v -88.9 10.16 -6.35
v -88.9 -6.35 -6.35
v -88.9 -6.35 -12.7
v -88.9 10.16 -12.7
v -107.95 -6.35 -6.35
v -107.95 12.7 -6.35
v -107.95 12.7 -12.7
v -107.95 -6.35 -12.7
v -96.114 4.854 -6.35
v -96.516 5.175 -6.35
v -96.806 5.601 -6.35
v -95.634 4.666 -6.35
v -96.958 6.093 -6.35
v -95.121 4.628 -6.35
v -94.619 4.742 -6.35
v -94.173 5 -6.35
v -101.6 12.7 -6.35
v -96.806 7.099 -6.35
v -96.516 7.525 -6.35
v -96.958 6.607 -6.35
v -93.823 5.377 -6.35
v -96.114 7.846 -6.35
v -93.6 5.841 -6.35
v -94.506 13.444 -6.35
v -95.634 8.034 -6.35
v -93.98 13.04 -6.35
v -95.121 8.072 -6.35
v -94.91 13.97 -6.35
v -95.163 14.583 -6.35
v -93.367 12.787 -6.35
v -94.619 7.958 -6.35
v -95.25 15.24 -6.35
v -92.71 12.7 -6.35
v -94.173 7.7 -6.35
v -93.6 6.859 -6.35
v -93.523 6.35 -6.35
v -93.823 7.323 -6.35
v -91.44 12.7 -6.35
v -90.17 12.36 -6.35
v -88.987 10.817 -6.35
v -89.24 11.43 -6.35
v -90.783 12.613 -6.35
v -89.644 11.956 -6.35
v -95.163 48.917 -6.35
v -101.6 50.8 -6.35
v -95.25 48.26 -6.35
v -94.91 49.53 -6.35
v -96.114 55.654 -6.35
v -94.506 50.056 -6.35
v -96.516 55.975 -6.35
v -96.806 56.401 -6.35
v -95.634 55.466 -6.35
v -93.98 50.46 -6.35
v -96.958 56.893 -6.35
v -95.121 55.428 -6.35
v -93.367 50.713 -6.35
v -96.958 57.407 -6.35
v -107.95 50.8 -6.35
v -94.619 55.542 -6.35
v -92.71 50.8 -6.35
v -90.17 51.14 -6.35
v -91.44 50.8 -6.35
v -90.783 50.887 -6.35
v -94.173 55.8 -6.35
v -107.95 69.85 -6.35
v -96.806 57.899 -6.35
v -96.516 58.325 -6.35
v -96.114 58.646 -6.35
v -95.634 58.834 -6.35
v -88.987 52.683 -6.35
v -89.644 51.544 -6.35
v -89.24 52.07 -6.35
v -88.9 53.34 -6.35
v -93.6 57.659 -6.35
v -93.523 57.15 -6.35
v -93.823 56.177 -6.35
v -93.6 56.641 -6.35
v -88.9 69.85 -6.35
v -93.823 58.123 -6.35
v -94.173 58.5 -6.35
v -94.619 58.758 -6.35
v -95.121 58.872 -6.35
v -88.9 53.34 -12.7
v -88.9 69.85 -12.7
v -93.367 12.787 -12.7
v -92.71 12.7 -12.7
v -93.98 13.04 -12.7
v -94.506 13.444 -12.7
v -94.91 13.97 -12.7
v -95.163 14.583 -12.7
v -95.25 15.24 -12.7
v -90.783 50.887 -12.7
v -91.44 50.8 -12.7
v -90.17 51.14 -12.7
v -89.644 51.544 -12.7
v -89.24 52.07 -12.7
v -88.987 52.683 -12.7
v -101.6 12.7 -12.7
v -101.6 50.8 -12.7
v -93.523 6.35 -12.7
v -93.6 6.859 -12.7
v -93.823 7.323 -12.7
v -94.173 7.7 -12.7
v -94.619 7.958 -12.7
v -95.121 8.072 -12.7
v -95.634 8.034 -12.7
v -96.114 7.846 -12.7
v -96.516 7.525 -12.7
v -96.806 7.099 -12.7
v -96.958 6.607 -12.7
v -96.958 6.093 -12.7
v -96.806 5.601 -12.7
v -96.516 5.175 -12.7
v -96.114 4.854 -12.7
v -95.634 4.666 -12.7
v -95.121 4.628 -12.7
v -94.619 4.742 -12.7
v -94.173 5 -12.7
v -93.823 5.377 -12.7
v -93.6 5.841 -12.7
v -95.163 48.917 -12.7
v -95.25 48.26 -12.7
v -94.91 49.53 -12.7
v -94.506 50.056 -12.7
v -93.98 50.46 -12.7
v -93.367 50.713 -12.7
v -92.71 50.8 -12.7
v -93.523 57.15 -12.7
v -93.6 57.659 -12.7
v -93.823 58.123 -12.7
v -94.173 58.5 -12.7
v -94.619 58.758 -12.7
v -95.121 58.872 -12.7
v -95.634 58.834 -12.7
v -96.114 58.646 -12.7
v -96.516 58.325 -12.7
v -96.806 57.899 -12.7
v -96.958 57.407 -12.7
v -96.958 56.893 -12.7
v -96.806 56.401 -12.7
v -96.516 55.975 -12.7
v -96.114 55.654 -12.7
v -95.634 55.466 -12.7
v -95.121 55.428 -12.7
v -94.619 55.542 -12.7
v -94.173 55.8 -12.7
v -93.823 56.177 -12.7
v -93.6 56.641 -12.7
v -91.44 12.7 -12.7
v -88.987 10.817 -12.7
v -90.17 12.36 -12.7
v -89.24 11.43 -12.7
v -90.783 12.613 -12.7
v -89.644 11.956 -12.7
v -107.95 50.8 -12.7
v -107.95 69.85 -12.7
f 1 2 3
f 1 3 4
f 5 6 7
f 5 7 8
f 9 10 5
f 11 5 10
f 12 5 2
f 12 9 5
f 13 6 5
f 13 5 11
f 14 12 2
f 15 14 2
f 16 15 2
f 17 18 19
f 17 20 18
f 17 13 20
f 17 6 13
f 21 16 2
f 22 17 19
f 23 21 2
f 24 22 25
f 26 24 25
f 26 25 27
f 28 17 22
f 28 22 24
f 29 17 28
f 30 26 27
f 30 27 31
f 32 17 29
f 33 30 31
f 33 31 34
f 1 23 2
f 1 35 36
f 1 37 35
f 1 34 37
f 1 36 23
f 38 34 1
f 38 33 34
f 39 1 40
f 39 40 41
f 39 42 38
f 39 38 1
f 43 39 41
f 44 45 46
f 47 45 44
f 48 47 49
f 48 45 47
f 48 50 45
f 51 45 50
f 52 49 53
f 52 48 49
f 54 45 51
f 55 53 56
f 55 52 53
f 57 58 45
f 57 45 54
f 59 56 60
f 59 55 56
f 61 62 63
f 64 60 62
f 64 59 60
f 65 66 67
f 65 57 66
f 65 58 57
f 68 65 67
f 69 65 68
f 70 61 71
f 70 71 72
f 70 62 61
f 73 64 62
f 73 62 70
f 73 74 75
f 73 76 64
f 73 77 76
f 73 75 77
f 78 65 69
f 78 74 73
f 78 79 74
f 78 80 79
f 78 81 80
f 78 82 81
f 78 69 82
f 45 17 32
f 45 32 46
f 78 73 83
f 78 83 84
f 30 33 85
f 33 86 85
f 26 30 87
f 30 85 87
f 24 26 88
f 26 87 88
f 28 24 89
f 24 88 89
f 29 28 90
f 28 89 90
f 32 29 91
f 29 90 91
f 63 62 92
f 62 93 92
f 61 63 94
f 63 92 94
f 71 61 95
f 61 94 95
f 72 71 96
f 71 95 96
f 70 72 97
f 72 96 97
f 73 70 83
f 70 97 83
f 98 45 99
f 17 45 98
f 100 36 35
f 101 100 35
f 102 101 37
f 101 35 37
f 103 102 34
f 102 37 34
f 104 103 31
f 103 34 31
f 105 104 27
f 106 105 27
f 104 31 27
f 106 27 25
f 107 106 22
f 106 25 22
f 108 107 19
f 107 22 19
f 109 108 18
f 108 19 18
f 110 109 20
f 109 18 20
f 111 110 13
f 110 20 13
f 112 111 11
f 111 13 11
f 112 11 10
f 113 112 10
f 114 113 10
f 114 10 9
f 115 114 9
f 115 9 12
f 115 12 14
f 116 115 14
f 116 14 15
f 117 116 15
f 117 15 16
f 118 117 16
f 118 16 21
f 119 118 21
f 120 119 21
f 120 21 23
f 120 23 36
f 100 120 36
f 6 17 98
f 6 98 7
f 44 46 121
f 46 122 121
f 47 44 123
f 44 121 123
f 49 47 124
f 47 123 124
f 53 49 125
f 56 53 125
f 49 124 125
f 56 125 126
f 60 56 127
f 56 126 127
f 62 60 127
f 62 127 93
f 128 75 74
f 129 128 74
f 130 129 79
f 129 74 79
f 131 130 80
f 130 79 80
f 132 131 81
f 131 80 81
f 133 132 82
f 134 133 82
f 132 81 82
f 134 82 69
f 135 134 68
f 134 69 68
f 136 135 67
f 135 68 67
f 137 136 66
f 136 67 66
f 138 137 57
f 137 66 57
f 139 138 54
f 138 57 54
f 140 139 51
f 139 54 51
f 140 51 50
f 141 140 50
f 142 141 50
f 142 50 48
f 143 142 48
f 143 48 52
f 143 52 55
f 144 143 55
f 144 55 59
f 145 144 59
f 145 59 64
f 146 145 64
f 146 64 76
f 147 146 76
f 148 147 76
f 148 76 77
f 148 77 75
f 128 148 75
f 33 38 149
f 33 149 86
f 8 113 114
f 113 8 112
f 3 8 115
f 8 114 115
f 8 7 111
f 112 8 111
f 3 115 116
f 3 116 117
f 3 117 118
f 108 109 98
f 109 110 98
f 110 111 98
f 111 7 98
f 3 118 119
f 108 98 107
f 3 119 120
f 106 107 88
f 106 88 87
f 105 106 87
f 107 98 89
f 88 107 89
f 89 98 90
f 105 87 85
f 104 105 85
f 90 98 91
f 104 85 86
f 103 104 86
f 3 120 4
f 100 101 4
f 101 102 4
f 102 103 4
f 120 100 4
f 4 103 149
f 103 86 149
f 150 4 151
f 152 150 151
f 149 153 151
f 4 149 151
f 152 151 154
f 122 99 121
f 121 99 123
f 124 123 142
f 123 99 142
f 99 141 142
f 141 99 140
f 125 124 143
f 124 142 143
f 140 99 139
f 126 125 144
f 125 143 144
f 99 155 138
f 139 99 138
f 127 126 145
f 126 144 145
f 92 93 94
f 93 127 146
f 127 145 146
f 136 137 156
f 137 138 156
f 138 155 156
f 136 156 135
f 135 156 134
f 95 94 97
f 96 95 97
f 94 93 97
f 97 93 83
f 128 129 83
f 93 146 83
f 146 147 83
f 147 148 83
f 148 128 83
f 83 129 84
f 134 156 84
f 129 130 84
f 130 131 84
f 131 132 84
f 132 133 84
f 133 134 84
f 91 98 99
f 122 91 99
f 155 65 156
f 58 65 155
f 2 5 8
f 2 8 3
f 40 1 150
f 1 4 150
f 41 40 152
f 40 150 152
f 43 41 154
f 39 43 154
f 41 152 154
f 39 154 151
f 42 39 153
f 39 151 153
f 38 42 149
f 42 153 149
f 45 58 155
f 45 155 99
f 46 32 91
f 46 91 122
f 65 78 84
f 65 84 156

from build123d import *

# Parameters (mm, degrees)
BOSS_EXTRUDE1_START = -6.35
BOSS_EXTRUDE1_DEPTH = 6.35
FILLET1_R           = 2.54
SKETCH2_R           = 1.7272
CUT_EXTRUDE1_DEPTH  = 129.734406823


with BuildPart() as part:
    # Sketch1 → Boss-Extrude1 (new body)
    with BuildSketch(Plane.XY.offset(BOSS_EXTRUDE1_START)):
        Polygon((-107.95, -6.35), (-88.9, -6.35), (-88.9, 12.7), (-95.25, 12.7), (-95.25, 50.8), (-88.9, 50.8), (-88.9, 69.85), (-107.95, 69.85), (-107.95, 50.8), (-101.6, 50.8), (-101.6, 12.7), (-107.95, 12.7), align=None)
    extrude(amount=-BOSS_EXTRUDE1_DEPTH)

    # Fillet1
    fillet1_edges = [part.edges().sort_by_distance(p)[0] for p in [
        (-88.9, 50.8, -9.525),
        (-95.25, 50.8, -9.525),
        (-95.25, 12.7, -9.525),
        (-88.9, 12.7, -9.525),
    ]]
    fillet(fillet1_edges, radius=FILLET1_R)

    # Sketch2 → Cut-Extrude1 (cut, through all)
    with BuildSketch(Plane.XY.offset(-6.35)):
        with Locations((-95.25, 6.35)):
            Circle(SKETCH2_R)
        with Locations((-95.25, 57.15)):
            Circle(SKETCH2_R)
    extrude(amount=-CUT_EXTRUDE1_DEPTH, mode=Mode.SUBTRACT)


solid = part.part
